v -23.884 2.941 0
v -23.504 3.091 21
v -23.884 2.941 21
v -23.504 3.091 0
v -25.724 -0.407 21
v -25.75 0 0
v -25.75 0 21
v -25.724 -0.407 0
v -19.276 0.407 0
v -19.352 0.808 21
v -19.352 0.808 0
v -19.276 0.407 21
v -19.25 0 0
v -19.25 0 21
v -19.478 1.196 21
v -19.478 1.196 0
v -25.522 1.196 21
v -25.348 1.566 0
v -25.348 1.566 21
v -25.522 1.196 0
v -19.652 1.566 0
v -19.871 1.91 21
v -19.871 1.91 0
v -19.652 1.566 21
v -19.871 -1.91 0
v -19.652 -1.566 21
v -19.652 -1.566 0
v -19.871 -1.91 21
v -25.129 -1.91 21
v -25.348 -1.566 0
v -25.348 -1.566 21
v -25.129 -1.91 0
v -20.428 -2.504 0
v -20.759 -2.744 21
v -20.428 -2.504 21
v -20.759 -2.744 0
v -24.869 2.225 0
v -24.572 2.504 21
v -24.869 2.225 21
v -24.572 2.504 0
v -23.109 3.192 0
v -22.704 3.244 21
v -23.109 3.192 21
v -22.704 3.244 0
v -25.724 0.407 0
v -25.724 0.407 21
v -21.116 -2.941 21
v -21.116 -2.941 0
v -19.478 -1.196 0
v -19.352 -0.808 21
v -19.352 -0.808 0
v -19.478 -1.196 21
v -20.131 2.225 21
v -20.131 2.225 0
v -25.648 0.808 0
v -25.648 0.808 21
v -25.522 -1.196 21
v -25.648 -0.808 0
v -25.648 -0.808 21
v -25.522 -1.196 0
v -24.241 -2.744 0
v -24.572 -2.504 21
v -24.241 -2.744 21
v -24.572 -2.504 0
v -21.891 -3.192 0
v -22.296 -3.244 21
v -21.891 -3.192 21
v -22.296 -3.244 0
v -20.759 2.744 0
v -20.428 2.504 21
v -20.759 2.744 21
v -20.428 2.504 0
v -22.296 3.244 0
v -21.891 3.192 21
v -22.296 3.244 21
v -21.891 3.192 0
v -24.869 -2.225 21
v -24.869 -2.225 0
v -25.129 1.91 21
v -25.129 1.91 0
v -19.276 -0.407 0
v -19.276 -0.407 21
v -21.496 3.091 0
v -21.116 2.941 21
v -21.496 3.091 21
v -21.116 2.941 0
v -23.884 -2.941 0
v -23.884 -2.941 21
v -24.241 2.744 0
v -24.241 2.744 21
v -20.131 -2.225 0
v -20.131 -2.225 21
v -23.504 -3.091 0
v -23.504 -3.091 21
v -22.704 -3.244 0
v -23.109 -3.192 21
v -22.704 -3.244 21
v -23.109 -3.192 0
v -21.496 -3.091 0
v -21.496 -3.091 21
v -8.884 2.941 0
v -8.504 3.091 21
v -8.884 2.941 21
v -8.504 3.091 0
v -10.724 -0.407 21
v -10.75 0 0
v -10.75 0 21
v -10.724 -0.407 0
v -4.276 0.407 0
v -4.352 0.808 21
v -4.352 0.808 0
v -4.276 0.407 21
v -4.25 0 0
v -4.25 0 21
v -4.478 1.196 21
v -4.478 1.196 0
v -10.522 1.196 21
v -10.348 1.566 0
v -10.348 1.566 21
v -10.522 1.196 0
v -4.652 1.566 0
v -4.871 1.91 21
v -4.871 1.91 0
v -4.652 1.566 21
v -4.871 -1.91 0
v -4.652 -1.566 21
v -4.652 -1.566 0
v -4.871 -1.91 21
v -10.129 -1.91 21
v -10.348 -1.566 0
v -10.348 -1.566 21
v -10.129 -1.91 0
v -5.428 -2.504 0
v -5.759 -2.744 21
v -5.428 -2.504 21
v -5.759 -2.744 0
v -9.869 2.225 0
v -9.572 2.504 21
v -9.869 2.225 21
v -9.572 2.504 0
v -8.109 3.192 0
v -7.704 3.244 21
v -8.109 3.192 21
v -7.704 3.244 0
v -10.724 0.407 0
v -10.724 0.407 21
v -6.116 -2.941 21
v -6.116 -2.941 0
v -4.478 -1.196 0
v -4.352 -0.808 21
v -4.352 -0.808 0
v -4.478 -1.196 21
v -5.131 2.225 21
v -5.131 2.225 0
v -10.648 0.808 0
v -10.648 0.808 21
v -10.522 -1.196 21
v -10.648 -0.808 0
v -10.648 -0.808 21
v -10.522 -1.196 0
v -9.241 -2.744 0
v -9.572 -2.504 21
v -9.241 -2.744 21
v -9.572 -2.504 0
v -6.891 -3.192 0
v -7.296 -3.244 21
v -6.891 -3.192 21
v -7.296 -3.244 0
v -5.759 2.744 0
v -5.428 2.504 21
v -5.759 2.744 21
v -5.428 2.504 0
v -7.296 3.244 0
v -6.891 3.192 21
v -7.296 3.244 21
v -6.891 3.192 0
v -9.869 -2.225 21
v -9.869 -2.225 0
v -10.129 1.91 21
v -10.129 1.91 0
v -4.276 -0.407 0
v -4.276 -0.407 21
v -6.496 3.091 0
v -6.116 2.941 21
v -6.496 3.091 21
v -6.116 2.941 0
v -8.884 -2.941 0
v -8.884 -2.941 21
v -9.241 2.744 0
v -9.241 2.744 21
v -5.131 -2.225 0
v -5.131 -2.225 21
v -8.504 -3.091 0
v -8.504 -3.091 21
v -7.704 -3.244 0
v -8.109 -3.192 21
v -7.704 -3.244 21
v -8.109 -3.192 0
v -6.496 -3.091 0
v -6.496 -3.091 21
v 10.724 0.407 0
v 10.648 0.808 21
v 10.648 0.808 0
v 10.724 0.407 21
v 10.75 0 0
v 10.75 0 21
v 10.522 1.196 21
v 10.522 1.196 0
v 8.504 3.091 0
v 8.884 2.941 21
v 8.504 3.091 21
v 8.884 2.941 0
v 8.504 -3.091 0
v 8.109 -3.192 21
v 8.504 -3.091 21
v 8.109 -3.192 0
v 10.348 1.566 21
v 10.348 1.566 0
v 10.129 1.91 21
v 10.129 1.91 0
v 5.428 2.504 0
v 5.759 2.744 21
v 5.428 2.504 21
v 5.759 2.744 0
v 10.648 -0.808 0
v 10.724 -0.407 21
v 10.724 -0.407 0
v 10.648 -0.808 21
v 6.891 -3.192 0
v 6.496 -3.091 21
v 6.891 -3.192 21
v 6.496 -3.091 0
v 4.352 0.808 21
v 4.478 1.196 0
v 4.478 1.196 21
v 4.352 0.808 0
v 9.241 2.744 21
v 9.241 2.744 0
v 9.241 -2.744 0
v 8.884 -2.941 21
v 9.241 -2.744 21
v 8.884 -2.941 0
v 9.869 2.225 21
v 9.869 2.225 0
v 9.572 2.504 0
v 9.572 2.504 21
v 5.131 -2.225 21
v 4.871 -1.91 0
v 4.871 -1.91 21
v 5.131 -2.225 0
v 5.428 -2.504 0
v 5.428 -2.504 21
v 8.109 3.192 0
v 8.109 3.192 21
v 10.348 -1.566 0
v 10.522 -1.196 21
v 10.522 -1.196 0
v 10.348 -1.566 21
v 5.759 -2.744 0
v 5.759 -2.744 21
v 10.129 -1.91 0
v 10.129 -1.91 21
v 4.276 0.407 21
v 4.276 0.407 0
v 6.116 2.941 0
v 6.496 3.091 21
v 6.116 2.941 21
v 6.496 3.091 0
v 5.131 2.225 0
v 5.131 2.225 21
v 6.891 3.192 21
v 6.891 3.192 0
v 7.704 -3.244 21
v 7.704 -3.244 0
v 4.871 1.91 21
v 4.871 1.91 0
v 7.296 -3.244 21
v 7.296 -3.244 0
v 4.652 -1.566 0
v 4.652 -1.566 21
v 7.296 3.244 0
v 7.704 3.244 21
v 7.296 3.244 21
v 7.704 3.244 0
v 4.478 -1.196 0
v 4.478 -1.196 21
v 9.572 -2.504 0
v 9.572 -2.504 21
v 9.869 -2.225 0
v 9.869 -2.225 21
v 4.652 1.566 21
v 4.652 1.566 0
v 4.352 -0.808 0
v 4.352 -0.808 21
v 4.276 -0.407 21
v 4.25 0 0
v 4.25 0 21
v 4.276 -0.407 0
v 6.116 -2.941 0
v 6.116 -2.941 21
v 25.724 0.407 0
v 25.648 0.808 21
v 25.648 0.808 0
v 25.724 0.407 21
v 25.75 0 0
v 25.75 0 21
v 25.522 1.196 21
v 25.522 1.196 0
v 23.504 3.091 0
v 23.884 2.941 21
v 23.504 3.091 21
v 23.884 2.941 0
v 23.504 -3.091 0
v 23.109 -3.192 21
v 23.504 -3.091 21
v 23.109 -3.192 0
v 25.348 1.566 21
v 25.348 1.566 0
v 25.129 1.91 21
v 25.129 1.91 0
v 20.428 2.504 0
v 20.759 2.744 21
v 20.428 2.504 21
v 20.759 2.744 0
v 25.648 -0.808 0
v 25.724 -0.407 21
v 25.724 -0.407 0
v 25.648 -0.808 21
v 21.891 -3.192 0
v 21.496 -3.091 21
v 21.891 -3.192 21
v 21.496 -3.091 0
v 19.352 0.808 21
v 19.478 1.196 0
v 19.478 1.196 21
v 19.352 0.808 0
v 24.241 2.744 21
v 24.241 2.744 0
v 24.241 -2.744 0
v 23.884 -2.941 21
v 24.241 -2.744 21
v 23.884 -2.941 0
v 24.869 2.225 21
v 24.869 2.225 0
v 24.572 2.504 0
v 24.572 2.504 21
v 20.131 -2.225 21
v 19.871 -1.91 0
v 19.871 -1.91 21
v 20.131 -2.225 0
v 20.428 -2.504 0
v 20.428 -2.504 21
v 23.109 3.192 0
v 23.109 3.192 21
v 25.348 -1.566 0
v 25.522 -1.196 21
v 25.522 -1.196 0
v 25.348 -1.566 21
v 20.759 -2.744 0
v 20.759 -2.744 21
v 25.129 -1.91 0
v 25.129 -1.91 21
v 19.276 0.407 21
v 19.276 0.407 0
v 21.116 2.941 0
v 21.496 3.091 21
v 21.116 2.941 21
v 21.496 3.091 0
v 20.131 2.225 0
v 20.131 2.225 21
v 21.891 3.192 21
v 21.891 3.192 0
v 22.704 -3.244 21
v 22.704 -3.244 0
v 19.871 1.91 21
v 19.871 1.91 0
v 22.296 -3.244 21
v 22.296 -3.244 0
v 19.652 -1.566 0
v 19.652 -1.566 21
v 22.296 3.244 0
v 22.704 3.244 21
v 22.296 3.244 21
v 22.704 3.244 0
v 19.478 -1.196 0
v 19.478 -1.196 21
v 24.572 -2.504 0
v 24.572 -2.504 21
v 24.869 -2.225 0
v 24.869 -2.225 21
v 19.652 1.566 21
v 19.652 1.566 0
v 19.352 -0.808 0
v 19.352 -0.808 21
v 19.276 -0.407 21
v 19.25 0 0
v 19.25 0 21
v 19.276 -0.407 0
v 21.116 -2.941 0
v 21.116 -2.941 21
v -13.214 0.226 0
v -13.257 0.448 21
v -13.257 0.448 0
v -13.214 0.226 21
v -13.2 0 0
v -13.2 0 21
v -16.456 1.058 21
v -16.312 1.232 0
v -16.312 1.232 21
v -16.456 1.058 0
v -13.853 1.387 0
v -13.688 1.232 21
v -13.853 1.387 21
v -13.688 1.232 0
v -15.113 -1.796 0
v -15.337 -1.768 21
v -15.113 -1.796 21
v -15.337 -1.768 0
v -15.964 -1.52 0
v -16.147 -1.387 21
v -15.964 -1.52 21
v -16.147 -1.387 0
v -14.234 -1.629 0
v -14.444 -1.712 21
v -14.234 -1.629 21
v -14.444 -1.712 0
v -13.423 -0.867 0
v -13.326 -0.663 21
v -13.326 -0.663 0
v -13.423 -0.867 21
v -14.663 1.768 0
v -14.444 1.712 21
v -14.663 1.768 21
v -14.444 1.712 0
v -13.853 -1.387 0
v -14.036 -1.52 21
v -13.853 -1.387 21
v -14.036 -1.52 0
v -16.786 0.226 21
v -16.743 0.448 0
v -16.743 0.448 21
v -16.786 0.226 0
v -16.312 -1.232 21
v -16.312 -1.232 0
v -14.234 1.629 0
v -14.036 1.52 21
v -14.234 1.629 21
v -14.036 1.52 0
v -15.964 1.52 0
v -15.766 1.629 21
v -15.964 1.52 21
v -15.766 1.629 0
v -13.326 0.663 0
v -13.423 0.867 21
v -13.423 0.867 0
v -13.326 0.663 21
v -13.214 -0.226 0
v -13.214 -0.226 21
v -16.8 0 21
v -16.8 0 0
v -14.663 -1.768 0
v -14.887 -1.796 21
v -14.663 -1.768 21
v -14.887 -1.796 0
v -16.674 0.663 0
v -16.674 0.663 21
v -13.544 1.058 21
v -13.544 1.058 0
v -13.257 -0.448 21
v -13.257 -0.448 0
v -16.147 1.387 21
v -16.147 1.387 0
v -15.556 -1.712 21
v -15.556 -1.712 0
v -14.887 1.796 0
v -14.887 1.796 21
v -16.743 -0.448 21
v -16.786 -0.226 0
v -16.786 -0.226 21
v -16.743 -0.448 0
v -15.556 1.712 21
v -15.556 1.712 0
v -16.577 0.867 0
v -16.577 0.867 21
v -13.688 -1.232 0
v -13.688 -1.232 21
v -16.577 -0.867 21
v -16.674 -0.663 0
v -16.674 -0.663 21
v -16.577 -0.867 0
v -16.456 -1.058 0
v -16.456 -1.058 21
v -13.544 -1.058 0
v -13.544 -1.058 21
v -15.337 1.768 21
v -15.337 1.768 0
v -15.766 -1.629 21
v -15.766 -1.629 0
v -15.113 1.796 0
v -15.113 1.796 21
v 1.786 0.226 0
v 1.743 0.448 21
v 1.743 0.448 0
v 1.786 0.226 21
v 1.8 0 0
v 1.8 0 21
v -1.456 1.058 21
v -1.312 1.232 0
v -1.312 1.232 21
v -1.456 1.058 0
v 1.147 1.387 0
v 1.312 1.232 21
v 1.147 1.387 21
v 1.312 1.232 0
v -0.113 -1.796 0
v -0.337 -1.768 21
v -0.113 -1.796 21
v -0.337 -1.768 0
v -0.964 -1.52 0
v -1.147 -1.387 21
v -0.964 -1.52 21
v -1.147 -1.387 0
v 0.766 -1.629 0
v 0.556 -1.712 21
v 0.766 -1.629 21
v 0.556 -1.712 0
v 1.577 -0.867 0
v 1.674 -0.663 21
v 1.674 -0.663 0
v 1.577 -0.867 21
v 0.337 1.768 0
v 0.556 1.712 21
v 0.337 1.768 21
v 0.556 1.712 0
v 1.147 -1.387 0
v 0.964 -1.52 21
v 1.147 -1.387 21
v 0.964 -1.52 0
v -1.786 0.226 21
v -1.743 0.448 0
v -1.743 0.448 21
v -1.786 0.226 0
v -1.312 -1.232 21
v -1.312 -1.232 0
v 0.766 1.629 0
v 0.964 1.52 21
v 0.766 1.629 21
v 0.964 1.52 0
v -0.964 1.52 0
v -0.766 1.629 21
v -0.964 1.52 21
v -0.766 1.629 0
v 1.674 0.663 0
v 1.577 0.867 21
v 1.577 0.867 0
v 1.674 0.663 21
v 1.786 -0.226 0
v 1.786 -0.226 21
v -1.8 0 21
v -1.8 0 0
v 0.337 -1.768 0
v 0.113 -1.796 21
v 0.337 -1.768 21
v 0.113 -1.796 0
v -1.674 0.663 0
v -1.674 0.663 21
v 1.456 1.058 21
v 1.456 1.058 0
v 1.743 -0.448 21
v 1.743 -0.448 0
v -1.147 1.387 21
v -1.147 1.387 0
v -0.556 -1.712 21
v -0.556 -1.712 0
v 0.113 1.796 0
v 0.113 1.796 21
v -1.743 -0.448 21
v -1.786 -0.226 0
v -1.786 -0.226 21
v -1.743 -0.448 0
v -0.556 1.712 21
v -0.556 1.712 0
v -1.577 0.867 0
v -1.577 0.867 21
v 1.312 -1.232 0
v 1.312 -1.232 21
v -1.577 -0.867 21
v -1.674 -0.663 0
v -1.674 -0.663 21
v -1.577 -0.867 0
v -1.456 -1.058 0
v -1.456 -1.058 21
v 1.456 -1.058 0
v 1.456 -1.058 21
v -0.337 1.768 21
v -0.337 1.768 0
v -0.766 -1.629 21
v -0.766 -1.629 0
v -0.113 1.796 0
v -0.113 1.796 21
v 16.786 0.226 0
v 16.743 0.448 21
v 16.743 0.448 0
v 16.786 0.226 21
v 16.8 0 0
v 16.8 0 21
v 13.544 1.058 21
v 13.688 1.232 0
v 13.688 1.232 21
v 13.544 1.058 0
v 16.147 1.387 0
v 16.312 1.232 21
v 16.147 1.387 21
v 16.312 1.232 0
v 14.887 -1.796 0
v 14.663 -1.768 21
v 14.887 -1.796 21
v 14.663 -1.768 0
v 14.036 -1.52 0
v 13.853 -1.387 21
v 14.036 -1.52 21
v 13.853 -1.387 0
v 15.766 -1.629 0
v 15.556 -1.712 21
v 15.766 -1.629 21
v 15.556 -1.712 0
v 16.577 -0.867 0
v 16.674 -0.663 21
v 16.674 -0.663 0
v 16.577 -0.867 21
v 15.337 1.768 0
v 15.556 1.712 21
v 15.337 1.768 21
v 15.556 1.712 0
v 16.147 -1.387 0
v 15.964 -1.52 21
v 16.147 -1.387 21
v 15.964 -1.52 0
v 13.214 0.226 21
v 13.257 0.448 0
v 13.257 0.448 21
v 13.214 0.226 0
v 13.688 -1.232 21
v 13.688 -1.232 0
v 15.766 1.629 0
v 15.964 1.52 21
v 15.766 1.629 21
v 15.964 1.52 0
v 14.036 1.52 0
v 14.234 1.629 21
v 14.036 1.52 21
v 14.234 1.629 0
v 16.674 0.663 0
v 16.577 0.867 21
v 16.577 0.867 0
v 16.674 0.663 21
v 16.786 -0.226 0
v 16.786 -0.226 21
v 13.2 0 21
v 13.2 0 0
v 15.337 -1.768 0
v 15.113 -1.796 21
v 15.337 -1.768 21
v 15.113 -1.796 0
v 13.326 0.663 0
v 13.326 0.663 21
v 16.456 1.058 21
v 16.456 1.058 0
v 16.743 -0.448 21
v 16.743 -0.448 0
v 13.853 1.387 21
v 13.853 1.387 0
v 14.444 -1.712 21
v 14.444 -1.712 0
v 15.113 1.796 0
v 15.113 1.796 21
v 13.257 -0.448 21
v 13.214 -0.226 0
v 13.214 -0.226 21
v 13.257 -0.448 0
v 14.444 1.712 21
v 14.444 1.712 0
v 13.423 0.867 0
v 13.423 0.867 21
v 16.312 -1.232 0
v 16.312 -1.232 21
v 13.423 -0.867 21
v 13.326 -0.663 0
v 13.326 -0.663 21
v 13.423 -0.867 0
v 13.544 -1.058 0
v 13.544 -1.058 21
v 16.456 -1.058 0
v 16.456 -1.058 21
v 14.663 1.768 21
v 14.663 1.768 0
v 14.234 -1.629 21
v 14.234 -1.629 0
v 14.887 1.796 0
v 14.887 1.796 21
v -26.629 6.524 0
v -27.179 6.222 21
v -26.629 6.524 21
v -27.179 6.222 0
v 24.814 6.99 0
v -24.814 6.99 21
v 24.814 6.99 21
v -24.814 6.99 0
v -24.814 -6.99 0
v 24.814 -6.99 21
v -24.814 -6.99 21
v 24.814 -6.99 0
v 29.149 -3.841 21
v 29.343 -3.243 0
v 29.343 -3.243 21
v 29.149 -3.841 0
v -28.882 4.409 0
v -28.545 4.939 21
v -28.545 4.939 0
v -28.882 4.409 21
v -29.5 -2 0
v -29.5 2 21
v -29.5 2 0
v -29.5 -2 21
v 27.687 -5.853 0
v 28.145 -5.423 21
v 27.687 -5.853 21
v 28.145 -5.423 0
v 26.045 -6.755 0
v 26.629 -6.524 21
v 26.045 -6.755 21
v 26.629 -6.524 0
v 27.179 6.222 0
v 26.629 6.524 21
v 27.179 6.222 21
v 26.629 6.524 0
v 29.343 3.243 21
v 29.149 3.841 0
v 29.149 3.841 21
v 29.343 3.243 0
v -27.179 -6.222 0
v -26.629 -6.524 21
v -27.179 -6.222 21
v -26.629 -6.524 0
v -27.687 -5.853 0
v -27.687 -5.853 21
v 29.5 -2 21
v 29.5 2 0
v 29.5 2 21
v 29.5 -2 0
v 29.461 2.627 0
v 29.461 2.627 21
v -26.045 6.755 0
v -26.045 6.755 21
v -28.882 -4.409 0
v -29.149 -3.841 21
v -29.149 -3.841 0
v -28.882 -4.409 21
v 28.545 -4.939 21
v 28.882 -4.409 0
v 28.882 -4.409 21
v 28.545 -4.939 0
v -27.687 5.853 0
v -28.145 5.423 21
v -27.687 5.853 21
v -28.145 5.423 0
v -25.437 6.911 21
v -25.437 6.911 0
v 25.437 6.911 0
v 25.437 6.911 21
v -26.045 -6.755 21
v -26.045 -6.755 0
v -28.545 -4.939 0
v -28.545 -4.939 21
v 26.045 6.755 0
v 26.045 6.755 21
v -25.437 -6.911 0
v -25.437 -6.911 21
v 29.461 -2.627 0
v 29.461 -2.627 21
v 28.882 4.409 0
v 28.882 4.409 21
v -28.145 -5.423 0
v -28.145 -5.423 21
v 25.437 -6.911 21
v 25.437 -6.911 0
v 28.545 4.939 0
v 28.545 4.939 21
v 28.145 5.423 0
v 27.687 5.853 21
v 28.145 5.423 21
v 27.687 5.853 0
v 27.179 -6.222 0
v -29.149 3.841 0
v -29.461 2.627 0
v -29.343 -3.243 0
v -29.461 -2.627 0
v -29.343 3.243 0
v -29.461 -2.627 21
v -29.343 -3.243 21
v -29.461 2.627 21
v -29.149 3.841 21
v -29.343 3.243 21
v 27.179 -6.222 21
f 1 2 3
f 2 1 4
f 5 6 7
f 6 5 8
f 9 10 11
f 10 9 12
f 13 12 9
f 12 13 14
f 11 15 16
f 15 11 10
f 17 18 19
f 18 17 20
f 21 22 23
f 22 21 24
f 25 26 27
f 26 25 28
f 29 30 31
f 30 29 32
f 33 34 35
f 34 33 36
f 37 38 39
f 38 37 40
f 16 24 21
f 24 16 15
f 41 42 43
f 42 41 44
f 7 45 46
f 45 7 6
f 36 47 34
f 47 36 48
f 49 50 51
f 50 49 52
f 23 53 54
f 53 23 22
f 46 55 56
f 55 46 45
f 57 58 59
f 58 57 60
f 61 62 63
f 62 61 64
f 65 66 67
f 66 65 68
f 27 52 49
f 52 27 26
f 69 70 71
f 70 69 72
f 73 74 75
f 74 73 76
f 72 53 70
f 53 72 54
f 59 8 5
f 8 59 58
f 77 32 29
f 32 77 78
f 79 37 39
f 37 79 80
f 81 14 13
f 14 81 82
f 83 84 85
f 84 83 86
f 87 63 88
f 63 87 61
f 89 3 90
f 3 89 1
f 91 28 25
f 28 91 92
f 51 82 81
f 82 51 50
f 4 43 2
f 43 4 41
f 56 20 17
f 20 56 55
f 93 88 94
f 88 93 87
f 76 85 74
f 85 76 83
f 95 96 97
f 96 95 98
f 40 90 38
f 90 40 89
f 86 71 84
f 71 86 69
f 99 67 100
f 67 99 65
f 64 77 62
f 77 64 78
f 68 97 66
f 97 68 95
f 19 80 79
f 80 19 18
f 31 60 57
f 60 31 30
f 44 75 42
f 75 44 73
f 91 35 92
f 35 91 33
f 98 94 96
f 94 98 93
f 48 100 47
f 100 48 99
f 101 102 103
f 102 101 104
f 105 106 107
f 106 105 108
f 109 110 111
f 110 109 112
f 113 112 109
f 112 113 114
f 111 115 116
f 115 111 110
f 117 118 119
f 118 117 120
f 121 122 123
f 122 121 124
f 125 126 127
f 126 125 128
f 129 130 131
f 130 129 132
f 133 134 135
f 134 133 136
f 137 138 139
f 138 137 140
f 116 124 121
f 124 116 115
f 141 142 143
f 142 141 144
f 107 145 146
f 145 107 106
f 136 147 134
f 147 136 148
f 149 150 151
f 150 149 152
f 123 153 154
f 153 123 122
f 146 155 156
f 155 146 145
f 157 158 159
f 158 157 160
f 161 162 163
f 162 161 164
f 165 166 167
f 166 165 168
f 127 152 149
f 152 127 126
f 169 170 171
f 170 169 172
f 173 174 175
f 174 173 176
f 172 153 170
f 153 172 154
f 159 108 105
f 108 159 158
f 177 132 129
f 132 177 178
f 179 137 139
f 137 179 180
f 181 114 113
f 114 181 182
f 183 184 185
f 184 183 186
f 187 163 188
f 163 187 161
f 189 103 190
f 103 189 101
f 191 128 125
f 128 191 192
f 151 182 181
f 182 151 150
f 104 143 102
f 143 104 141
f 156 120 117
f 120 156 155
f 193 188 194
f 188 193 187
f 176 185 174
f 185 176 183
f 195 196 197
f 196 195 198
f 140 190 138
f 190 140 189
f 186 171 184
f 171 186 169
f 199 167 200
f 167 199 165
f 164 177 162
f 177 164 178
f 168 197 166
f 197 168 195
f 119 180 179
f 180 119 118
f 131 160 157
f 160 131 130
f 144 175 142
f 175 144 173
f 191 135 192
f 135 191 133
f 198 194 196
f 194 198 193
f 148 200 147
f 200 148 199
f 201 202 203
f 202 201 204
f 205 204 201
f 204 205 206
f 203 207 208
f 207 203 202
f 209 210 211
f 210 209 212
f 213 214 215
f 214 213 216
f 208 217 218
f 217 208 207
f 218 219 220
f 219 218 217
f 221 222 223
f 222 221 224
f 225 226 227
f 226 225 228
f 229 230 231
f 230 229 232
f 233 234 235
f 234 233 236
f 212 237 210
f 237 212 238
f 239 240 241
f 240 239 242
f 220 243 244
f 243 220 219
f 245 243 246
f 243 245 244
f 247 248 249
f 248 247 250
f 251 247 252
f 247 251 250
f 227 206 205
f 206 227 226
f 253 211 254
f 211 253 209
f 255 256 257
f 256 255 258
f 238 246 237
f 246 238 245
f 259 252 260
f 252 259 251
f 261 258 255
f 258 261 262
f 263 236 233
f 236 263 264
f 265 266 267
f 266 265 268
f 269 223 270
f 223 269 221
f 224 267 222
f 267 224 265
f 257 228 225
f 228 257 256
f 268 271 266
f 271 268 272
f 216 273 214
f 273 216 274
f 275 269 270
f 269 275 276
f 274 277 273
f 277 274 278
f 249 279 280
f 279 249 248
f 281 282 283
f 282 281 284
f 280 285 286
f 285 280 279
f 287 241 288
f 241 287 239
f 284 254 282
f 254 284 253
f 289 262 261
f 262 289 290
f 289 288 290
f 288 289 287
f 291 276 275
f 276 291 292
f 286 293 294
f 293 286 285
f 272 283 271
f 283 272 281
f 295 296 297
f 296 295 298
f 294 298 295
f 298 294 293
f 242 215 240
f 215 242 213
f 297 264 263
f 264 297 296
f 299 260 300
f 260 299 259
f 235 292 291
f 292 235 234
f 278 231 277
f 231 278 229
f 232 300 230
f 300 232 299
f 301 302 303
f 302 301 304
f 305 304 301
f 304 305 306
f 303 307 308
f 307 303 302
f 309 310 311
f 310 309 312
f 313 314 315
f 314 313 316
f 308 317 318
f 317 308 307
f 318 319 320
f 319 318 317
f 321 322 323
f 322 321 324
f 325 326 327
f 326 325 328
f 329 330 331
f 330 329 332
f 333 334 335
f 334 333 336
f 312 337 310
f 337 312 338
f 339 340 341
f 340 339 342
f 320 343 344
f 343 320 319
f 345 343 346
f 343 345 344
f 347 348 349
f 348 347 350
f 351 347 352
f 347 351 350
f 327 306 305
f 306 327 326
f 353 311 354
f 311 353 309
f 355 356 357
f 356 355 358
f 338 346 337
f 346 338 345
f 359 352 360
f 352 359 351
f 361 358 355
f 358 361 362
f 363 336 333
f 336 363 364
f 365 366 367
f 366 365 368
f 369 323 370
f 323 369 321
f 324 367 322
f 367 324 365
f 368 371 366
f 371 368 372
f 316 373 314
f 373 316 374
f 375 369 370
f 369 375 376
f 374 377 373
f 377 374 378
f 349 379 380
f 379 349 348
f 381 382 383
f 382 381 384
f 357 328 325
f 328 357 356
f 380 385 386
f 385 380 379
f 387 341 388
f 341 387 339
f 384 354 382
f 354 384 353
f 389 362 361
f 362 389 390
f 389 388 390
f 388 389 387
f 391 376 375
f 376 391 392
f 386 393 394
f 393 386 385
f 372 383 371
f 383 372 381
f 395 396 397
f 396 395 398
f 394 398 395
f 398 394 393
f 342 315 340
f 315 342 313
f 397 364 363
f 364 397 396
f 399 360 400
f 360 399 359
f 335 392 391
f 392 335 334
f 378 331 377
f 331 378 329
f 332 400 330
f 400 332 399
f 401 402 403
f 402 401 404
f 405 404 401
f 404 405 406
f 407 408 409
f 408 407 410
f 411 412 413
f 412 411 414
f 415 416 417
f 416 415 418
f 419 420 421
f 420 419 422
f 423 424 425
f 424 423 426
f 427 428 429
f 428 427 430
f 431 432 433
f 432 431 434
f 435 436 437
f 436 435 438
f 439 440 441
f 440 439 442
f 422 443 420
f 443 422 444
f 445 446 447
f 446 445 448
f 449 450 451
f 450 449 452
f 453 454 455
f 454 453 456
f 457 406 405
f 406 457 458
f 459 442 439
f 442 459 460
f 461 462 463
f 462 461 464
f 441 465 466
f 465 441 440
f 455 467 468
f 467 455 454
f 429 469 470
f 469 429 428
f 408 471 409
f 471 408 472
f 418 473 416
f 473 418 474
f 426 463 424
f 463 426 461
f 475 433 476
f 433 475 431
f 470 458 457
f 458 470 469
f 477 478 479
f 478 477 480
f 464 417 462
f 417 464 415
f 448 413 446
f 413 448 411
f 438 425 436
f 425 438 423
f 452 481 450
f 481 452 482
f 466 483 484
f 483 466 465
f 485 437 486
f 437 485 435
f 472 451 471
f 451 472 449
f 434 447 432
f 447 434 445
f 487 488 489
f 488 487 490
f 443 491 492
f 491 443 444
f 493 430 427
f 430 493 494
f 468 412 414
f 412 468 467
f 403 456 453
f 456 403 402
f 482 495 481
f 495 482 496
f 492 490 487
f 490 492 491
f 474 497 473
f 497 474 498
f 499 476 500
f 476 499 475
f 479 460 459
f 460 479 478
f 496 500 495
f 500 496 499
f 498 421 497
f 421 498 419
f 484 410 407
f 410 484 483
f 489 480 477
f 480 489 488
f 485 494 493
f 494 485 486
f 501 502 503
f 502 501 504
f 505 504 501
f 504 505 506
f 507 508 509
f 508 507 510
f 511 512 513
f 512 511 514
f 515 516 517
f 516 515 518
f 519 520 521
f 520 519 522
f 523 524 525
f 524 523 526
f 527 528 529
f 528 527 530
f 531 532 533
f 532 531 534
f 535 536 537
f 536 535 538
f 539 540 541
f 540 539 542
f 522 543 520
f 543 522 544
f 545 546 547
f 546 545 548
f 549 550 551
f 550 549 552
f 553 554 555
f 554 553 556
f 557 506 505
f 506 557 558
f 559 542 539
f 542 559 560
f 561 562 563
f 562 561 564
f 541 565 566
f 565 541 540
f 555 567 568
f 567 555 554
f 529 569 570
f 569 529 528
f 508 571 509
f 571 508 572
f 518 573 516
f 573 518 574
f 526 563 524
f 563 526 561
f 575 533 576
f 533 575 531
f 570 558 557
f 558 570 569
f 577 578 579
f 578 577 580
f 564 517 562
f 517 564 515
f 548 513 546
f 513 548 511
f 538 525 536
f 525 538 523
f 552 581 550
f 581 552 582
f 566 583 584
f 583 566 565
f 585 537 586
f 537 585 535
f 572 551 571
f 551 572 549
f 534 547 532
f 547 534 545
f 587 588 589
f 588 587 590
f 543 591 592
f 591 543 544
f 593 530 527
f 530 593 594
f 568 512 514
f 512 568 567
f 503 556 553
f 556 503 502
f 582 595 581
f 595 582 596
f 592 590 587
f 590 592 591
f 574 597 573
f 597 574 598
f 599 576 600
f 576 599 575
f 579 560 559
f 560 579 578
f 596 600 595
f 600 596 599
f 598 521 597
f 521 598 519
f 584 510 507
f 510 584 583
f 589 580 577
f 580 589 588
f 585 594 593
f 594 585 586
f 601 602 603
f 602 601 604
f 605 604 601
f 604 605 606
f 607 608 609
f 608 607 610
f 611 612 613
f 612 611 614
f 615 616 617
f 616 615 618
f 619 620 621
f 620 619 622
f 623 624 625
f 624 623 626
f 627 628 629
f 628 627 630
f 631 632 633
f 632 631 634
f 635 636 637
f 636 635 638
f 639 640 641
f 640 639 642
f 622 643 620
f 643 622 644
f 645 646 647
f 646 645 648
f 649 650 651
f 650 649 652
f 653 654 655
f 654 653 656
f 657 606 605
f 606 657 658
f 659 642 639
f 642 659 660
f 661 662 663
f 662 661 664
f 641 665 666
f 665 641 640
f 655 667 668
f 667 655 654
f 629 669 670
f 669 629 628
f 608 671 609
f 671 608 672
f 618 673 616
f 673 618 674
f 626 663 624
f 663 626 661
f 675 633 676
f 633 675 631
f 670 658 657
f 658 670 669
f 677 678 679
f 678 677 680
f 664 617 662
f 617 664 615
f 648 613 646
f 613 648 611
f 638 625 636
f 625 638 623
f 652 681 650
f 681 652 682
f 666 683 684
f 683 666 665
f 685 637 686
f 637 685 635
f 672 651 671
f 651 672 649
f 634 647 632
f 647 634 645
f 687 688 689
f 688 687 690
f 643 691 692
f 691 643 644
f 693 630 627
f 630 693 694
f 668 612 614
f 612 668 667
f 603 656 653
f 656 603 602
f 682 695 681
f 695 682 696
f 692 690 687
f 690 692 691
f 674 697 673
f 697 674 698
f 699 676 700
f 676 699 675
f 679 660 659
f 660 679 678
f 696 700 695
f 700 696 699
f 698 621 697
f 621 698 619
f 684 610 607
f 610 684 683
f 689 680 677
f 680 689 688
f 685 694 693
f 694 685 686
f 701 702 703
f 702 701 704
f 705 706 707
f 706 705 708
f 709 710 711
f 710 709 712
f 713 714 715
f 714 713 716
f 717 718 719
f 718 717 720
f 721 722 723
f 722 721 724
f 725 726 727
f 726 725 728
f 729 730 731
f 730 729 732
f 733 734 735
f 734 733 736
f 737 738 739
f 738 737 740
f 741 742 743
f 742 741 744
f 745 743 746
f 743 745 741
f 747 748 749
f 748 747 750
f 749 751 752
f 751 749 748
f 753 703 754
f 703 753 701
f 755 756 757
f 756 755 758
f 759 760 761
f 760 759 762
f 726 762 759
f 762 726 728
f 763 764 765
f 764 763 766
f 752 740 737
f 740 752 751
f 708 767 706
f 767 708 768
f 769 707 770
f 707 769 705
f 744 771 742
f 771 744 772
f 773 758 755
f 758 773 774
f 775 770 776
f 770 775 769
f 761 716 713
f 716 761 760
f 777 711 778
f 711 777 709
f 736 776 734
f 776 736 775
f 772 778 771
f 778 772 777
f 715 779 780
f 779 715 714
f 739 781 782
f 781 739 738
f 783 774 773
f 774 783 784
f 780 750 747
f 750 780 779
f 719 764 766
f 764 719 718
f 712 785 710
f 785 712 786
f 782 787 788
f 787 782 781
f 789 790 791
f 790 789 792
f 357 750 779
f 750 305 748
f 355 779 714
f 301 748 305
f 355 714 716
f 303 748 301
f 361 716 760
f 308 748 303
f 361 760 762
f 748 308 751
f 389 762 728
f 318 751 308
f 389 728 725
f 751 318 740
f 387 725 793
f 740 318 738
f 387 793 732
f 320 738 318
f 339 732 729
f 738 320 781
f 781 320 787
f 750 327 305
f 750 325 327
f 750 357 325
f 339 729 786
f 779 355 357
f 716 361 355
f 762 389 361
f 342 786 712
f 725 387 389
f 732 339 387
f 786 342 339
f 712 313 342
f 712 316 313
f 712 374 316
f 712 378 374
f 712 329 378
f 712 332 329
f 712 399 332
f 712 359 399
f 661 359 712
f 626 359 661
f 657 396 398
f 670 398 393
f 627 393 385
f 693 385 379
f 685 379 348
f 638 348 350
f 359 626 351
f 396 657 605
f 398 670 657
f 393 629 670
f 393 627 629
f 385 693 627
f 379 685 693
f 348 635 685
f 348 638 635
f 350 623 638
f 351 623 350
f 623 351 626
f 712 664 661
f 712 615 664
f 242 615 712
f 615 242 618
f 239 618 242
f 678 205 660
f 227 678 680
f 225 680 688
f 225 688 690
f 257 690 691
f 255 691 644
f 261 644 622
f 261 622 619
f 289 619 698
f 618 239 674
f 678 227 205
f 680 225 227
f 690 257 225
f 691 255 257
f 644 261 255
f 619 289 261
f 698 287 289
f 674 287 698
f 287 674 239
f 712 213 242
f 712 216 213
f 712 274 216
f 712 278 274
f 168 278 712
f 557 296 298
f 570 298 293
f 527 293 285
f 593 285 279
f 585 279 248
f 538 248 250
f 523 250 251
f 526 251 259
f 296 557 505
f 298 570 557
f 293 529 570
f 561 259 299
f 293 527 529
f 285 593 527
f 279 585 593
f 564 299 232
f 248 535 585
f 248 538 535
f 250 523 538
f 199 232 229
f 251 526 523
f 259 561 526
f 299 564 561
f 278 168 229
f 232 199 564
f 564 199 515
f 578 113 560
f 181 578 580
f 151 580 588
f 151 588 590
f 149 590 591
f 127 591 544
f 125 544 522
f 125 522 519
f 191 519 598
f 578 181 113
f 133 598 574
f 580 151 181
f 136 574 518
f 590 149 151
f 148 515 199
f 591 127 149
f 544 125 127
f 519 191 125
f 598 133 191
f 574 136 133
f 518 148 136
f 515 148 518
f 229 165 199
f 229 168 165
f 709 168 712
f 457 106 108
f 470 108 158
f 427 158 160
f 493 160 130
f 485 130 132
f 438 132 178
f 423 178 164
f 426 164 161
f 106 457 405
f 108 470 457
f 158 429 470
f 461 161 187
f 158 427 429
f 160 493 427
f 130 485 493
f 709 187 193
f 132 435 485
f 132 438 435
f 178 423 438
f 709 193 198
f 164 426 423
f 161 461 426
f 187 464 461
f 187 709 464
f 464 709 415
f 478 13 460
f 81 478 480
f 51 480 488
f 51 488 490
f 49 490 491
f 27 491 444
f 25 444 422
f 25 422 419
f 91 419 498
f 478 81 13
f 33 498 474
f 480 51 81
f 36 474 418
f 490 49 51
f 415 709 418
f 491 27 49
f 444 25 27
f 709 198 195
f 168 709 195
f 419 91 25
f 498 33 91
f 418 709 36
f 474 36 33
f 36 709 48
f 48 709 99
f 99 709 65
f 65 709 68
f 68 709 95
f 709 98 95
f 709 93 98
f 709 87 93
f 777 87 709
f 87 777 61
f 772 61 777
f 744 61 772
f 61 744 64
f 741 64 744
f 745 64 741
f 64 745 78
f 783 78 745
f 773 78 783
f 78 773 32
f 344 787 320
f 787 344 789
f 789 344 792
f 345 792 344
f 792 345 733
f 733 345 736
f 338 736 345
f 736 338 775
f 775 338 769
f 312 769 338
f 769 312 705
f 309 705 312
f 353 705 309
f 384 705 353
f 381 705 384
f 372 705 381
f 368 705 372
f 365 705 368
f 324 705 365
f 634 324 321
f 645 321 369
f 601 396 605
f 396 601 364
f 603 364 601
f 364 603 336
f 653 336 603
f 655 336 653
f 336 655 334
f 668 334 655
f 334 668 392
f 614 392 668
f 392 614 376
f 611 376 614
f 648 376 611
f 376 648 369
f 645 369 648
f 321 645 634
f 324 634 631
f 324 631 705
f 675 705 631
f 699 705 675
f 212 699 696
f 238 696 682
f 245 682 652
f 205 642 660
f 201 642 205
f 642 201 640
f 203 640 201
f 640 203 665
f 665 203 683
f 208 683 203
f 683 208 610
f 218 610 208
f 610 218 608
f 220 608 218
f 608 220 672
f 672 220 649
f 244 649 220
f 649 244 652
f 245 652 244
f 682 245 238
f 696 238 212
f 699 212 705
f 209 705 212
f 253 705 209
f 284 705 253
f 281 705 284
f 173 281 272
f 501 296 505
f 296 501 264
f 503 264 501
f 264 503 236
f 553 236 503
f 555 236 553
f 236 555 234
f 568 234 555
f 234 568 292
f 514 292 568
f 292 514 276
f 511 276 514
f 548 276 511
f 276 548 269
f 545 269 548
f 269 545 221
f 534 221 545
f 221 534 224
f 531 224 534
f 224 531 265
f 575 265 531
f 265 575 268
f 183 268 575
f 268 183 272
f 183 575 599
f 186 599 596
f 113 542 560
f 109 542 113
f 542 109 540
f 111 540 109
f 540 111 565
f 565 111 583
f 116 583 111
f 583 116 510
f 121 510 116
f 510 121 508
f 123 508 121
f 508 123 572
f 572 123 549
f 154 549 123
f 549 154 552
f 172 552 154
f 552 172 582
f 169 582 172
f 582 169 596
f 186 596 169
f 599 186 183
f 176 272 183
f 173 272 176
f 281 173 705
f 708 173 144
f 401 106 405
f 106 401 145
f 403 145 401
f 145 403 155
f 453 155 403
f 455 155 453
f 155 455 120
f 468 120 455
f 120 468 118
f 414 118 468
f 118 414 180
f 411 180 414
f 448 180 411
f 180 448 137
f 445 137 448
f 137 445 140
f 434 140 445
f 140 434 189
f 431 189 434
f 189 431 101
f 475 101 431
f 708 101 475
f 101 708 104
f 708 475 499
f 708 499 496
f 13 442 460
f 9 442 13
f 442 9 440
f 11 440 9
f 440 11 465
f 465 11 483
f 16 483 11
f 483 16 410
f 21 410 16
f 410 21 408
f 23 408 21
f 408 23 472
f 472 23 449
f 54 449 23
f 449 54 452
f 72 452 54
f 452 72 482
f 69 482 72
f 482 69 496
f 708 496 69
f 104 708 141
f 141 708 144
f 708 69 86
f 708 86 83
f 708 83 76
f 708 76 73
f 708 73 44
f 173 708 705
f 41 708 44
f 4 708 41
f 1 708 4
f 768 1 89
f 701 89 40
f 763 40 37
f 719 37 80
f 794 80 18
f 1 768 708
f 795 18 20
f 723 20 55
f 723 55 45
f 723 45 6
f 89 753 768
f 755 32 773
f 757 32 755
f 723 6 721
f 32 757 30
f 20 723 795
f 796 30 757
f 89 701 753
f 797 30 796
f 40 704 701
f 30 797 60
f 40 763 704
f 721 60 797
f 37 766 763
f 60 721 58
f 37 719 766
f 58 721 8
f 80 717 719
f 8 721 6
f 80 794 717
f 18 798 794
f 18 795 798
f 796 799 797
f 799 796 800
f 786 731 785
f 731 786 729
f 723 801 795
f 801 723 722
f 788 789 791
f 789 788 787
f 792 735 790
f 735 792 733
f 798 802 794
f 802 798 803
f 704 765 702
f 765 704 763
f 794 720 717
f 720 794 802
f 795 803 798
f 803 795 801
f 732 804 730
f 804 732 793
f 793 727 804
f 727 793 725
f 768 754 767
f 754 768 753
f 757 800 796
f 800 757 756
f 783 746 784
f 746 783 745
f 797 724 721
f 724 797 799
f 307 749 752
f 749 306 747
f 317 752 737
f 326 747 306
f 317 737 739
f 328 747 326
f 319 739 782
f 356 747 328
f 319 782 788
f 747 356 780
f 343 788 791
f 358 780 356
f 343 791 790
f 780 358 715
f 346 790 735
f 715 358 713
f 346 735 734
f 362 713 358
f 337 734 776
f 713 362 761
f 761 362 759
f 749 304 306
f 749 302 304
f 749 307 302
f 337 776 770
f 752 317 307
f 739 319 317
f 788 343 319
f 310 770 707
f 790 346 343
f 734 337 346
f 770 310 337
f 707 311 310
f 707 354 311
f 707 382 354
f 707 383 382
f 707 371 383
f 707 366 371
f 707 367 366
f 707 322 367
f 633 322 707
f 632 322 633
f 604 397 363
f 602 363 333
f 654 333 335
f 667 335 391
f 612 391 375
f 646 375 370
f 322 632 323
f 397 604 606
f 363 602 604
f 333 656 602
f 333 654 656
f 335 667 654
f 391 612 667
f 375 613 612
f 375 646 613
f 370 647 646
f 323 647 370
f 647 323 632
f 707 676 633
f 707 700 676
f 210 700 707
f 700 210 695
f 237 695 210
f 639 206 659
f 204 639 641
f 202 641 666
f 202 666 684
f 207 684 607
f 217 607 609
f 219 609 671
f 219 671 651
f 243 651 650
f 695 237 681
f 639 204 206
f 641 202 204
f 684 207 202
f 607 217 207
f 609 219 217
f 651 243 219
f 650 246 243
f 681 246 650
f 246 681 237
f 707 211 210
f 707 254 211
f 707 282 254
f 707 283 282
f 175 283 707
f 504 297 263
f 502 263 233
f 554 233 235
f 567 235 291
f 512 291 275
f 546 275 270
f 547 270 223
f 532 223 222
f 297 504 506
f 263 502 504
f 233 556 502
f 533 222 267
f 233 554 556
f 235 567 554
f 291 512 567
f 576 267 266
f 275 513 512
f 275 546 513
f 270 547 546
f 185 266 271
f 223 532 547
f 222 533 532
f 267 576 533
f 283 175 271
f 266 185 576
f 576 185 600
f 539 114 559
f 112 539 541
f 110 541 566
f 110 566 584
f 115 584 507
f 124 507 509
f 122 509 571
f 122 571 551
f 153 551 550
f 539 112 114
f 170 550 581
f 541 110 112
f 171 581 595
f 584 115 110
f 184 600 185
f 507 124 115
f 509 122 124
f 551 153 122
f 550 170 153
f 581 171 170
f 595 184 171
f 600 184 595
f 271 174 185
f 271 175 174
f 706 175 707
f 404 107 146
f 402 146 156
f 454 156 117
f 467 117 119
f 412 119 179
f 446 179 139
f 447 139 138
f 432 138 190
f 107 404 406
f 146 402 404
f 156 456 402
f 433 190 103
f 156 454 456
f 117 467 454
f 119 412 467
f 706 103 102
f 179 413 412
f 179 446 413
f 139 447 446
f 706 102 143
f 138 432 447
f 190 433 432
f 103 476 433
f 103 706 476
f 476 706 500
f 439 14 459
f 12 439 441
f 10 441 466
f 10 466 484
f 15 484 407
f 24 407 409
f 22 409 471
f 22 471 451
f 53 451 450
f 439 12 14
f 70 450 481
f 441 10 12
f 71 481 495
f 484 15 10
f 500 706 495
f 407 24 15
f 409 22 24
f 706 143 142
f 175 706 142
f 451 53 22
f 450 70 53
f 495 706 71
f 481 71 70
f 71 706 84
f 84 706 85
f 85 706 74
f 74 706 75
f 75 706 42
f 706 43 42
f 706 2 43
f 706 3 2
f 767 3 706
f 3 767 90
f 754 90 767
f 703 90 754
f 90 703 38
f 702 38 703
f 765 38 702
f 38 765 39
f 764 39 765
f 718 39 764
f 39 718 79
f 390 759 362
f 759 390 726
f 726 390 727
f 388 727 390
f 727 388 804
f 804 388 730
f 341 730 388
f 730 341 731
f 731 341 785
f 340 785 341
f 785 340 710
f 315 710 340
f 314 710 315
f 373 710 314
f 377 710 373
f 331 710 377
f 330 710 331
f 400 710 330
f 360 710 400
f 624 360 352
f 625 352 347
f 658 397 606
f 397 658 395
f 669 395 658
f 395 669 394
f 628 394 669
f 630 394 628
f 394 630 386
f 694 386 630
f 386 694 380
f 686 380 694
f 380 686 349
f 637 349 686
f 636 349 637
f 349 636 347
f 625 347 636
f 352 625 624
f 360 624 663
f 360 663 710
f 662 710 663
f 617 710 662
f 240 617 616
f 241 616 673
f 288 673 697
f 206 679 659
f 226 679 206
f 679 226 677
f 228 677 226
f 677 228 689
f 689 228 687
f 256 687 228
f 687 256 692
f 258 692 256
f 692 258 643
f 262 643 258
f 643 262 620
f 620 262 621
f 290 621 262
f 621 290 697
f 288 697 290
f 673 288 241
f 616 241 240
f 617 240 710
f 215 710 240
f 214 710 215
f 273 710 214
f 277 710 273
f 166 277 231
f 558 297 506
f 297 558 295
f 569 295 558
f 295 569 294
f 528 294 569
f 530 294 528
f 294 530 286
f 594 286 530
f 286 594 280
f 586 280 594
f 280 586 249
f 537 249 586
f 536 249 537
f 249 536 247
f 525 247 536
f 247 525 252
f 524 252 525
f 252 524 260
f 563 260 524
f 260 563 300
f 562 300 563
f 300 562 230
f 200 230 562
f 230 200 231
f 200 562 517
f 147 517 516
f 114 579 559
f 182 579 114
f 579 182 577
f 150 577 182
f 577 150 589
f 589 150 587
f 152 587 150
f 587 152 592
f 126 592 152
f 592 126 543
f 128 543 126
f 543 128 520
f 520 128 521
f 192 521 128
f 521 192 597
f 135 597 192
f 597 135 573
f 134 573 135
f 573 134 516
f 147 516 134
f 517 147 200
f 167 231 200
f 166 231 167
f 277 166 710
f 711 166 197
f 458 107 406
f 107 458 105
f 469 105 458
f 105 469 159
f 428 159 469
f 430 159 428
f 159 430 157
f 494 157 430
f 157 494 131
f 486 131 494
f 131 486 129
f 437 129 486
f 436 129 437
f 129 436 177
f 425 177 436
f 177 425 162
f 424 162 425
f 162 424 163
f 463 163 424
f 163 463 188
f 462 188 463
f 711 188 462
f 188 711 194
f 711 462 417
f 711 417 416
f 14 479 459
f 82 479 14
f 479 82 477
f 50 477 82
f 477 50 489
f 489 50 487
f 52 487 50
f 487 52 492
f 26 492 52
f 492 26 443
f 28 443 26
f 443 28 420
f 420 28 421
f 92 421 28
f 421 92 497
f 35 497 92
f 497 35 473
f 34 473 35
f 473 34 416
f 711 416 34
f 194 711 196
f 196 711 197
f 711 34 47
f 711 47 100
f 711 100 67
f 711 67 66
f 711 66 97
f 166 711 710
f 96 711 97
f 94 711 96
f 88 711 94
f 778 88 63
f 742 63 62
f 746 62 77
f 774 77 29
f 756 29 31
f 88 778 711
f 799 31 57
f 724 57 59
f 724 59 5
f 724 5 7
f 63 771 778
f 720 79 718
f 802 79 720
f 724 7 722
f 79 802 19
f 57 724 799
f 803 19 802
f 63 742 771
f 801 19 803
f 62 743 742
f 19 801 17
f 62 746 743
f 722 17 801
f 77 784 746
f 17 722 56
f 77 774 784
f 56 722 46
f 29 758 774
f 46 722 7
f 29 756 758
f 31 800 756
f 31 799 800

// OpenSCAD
$fn = 50;


difference() {
	union() {
		*color(alpha = 1.0000000000, c = "gray") {
			translate(v = [0, 7, 0]) {
				linear_extrude(height = 1) {
					text(font = "Arial:style=Bold", halign = "center", size = 4.5000000000, text = "COMMENT plate main", valign = "center");
				}
			}
		}
		*color(alpha = 1.0000000000, c = "gray") {
			translate(v = [0, 14, 0]) {
				linear_extrude(height = 1) {
					text(font = "Arial:style=Bold", halign = "center", size = 4.5000000000, text = "COMMENT description oobb_plate_shape_p_type_21_depth_4_width_1_height_21_thickness_true_both_holes", valign = "center");
				}
			}
		}
		hull() {
			translate(v = [-24.5000000000, 2.0000000000, 0]) {
				cylinder(h = 21, r = 5);
			}
			translate(v = [24.5000000000, 2.0000000000, 0]) {
				cylinder(h = 21, r = 5);
			}
			translate(v = [-24.5000000000, -2.0000000000, 0]) {
				cylinder(h = 21, r = 5);
			}
			translate(v = [24.5000000000, -2.0000000000, 0]) {
				cylinder(h = 21, r = 5);
			}
		}
	}
	union() {
		*color(alpha = 1.0000000000, c = "gray") {
			translate(v = [0, 7, 0]) {
				linear_extrude(height = 1) {
					text(font = "Arial:style=Bold", halign = "center", size = 4.5000000000, text = "COMMENT holes main", valign = "center");
				}
			}
		}
		*color(alpha = 1.0000000000, c = "gray") {
			translate(v = [0, 14, 0]) {
				linear_extrude(height = 1) {
					text(font = "Arial:style=Bold", halign = "center", size = 4.5000000000, text = "COMMENT description oobb_holes_shape_n_type_4_width_1_height_21_thickness_true_both_holes", valign = "center");
				}
			}
		}
		translate(v = [-22.5000000000, 0.0000000000, 0]) {
			translate(v = [0, 0, -50]) {
				cylinder(h = 100, r = 3.2500000000);
			}
		}
		translate(v = [-7.5000000000, 0.0000000000, 0]) {
			translate(v = [0, 0, -50]) {
				cylinder(h = 100, r = 3.2500000000);
			}
		}
		translate(v = [7.5000000000, 0.0000000000, 0]) {
			translate(v = [0, 0, -50]) {
				cylinder(h = 100, r = 3.2500000000);
			}
		}
		translate(v = [22.5000000000, 0.0000000000, 0]) {
			translate(v = [0, 0, -50]) {
				cylinder(h = 100, r = 3.2500000000);
			}
		}
		translate(v = [-22.5000000000, 0.0000000000, 0]) {
			translate(v = [0, 0, -50]) {
				cylinder(h = 100, r = 1.8000000000);
			}
		}
		translate(v = [-15.0000000000, 0.0000000000, 0]) {
			translate(v = [0, 0, -50]) {
				cylinder(h = 100, r = 1.8000000000);
			}
		}
		translate(v = [-7.5000000000, 0.0000000000, 0]) {
			translate(v = [0, 0, -50]) {
				cylinder(h = 100, r = 1.8000000000);
			}
		}
		translate(v = [0, 0, -50]) {
			cylinder(h = 100, r = 1.8000000000);
		}
		translate(v = [7.5000000000, 0.0000000000, 0]) {
			translate(v = [0, 0, -50]) {
				cylinder(h = 100, r = 1.8000000000);
			}
		}
		translate(v = [15.0000000000, 0.0000000000, 0]) {
			translate(v = [0, 0, -50]) {
				cylinder(h = 100, r = 1.8000000000);
			}
		}
		translate(v = [22.5000000000, 0.0000000000, 0]) {
			translate(v = [0, 0, -50]) {
				cylinder(h = 100, r = 1.8000000000);
			}
		}
	}
}
